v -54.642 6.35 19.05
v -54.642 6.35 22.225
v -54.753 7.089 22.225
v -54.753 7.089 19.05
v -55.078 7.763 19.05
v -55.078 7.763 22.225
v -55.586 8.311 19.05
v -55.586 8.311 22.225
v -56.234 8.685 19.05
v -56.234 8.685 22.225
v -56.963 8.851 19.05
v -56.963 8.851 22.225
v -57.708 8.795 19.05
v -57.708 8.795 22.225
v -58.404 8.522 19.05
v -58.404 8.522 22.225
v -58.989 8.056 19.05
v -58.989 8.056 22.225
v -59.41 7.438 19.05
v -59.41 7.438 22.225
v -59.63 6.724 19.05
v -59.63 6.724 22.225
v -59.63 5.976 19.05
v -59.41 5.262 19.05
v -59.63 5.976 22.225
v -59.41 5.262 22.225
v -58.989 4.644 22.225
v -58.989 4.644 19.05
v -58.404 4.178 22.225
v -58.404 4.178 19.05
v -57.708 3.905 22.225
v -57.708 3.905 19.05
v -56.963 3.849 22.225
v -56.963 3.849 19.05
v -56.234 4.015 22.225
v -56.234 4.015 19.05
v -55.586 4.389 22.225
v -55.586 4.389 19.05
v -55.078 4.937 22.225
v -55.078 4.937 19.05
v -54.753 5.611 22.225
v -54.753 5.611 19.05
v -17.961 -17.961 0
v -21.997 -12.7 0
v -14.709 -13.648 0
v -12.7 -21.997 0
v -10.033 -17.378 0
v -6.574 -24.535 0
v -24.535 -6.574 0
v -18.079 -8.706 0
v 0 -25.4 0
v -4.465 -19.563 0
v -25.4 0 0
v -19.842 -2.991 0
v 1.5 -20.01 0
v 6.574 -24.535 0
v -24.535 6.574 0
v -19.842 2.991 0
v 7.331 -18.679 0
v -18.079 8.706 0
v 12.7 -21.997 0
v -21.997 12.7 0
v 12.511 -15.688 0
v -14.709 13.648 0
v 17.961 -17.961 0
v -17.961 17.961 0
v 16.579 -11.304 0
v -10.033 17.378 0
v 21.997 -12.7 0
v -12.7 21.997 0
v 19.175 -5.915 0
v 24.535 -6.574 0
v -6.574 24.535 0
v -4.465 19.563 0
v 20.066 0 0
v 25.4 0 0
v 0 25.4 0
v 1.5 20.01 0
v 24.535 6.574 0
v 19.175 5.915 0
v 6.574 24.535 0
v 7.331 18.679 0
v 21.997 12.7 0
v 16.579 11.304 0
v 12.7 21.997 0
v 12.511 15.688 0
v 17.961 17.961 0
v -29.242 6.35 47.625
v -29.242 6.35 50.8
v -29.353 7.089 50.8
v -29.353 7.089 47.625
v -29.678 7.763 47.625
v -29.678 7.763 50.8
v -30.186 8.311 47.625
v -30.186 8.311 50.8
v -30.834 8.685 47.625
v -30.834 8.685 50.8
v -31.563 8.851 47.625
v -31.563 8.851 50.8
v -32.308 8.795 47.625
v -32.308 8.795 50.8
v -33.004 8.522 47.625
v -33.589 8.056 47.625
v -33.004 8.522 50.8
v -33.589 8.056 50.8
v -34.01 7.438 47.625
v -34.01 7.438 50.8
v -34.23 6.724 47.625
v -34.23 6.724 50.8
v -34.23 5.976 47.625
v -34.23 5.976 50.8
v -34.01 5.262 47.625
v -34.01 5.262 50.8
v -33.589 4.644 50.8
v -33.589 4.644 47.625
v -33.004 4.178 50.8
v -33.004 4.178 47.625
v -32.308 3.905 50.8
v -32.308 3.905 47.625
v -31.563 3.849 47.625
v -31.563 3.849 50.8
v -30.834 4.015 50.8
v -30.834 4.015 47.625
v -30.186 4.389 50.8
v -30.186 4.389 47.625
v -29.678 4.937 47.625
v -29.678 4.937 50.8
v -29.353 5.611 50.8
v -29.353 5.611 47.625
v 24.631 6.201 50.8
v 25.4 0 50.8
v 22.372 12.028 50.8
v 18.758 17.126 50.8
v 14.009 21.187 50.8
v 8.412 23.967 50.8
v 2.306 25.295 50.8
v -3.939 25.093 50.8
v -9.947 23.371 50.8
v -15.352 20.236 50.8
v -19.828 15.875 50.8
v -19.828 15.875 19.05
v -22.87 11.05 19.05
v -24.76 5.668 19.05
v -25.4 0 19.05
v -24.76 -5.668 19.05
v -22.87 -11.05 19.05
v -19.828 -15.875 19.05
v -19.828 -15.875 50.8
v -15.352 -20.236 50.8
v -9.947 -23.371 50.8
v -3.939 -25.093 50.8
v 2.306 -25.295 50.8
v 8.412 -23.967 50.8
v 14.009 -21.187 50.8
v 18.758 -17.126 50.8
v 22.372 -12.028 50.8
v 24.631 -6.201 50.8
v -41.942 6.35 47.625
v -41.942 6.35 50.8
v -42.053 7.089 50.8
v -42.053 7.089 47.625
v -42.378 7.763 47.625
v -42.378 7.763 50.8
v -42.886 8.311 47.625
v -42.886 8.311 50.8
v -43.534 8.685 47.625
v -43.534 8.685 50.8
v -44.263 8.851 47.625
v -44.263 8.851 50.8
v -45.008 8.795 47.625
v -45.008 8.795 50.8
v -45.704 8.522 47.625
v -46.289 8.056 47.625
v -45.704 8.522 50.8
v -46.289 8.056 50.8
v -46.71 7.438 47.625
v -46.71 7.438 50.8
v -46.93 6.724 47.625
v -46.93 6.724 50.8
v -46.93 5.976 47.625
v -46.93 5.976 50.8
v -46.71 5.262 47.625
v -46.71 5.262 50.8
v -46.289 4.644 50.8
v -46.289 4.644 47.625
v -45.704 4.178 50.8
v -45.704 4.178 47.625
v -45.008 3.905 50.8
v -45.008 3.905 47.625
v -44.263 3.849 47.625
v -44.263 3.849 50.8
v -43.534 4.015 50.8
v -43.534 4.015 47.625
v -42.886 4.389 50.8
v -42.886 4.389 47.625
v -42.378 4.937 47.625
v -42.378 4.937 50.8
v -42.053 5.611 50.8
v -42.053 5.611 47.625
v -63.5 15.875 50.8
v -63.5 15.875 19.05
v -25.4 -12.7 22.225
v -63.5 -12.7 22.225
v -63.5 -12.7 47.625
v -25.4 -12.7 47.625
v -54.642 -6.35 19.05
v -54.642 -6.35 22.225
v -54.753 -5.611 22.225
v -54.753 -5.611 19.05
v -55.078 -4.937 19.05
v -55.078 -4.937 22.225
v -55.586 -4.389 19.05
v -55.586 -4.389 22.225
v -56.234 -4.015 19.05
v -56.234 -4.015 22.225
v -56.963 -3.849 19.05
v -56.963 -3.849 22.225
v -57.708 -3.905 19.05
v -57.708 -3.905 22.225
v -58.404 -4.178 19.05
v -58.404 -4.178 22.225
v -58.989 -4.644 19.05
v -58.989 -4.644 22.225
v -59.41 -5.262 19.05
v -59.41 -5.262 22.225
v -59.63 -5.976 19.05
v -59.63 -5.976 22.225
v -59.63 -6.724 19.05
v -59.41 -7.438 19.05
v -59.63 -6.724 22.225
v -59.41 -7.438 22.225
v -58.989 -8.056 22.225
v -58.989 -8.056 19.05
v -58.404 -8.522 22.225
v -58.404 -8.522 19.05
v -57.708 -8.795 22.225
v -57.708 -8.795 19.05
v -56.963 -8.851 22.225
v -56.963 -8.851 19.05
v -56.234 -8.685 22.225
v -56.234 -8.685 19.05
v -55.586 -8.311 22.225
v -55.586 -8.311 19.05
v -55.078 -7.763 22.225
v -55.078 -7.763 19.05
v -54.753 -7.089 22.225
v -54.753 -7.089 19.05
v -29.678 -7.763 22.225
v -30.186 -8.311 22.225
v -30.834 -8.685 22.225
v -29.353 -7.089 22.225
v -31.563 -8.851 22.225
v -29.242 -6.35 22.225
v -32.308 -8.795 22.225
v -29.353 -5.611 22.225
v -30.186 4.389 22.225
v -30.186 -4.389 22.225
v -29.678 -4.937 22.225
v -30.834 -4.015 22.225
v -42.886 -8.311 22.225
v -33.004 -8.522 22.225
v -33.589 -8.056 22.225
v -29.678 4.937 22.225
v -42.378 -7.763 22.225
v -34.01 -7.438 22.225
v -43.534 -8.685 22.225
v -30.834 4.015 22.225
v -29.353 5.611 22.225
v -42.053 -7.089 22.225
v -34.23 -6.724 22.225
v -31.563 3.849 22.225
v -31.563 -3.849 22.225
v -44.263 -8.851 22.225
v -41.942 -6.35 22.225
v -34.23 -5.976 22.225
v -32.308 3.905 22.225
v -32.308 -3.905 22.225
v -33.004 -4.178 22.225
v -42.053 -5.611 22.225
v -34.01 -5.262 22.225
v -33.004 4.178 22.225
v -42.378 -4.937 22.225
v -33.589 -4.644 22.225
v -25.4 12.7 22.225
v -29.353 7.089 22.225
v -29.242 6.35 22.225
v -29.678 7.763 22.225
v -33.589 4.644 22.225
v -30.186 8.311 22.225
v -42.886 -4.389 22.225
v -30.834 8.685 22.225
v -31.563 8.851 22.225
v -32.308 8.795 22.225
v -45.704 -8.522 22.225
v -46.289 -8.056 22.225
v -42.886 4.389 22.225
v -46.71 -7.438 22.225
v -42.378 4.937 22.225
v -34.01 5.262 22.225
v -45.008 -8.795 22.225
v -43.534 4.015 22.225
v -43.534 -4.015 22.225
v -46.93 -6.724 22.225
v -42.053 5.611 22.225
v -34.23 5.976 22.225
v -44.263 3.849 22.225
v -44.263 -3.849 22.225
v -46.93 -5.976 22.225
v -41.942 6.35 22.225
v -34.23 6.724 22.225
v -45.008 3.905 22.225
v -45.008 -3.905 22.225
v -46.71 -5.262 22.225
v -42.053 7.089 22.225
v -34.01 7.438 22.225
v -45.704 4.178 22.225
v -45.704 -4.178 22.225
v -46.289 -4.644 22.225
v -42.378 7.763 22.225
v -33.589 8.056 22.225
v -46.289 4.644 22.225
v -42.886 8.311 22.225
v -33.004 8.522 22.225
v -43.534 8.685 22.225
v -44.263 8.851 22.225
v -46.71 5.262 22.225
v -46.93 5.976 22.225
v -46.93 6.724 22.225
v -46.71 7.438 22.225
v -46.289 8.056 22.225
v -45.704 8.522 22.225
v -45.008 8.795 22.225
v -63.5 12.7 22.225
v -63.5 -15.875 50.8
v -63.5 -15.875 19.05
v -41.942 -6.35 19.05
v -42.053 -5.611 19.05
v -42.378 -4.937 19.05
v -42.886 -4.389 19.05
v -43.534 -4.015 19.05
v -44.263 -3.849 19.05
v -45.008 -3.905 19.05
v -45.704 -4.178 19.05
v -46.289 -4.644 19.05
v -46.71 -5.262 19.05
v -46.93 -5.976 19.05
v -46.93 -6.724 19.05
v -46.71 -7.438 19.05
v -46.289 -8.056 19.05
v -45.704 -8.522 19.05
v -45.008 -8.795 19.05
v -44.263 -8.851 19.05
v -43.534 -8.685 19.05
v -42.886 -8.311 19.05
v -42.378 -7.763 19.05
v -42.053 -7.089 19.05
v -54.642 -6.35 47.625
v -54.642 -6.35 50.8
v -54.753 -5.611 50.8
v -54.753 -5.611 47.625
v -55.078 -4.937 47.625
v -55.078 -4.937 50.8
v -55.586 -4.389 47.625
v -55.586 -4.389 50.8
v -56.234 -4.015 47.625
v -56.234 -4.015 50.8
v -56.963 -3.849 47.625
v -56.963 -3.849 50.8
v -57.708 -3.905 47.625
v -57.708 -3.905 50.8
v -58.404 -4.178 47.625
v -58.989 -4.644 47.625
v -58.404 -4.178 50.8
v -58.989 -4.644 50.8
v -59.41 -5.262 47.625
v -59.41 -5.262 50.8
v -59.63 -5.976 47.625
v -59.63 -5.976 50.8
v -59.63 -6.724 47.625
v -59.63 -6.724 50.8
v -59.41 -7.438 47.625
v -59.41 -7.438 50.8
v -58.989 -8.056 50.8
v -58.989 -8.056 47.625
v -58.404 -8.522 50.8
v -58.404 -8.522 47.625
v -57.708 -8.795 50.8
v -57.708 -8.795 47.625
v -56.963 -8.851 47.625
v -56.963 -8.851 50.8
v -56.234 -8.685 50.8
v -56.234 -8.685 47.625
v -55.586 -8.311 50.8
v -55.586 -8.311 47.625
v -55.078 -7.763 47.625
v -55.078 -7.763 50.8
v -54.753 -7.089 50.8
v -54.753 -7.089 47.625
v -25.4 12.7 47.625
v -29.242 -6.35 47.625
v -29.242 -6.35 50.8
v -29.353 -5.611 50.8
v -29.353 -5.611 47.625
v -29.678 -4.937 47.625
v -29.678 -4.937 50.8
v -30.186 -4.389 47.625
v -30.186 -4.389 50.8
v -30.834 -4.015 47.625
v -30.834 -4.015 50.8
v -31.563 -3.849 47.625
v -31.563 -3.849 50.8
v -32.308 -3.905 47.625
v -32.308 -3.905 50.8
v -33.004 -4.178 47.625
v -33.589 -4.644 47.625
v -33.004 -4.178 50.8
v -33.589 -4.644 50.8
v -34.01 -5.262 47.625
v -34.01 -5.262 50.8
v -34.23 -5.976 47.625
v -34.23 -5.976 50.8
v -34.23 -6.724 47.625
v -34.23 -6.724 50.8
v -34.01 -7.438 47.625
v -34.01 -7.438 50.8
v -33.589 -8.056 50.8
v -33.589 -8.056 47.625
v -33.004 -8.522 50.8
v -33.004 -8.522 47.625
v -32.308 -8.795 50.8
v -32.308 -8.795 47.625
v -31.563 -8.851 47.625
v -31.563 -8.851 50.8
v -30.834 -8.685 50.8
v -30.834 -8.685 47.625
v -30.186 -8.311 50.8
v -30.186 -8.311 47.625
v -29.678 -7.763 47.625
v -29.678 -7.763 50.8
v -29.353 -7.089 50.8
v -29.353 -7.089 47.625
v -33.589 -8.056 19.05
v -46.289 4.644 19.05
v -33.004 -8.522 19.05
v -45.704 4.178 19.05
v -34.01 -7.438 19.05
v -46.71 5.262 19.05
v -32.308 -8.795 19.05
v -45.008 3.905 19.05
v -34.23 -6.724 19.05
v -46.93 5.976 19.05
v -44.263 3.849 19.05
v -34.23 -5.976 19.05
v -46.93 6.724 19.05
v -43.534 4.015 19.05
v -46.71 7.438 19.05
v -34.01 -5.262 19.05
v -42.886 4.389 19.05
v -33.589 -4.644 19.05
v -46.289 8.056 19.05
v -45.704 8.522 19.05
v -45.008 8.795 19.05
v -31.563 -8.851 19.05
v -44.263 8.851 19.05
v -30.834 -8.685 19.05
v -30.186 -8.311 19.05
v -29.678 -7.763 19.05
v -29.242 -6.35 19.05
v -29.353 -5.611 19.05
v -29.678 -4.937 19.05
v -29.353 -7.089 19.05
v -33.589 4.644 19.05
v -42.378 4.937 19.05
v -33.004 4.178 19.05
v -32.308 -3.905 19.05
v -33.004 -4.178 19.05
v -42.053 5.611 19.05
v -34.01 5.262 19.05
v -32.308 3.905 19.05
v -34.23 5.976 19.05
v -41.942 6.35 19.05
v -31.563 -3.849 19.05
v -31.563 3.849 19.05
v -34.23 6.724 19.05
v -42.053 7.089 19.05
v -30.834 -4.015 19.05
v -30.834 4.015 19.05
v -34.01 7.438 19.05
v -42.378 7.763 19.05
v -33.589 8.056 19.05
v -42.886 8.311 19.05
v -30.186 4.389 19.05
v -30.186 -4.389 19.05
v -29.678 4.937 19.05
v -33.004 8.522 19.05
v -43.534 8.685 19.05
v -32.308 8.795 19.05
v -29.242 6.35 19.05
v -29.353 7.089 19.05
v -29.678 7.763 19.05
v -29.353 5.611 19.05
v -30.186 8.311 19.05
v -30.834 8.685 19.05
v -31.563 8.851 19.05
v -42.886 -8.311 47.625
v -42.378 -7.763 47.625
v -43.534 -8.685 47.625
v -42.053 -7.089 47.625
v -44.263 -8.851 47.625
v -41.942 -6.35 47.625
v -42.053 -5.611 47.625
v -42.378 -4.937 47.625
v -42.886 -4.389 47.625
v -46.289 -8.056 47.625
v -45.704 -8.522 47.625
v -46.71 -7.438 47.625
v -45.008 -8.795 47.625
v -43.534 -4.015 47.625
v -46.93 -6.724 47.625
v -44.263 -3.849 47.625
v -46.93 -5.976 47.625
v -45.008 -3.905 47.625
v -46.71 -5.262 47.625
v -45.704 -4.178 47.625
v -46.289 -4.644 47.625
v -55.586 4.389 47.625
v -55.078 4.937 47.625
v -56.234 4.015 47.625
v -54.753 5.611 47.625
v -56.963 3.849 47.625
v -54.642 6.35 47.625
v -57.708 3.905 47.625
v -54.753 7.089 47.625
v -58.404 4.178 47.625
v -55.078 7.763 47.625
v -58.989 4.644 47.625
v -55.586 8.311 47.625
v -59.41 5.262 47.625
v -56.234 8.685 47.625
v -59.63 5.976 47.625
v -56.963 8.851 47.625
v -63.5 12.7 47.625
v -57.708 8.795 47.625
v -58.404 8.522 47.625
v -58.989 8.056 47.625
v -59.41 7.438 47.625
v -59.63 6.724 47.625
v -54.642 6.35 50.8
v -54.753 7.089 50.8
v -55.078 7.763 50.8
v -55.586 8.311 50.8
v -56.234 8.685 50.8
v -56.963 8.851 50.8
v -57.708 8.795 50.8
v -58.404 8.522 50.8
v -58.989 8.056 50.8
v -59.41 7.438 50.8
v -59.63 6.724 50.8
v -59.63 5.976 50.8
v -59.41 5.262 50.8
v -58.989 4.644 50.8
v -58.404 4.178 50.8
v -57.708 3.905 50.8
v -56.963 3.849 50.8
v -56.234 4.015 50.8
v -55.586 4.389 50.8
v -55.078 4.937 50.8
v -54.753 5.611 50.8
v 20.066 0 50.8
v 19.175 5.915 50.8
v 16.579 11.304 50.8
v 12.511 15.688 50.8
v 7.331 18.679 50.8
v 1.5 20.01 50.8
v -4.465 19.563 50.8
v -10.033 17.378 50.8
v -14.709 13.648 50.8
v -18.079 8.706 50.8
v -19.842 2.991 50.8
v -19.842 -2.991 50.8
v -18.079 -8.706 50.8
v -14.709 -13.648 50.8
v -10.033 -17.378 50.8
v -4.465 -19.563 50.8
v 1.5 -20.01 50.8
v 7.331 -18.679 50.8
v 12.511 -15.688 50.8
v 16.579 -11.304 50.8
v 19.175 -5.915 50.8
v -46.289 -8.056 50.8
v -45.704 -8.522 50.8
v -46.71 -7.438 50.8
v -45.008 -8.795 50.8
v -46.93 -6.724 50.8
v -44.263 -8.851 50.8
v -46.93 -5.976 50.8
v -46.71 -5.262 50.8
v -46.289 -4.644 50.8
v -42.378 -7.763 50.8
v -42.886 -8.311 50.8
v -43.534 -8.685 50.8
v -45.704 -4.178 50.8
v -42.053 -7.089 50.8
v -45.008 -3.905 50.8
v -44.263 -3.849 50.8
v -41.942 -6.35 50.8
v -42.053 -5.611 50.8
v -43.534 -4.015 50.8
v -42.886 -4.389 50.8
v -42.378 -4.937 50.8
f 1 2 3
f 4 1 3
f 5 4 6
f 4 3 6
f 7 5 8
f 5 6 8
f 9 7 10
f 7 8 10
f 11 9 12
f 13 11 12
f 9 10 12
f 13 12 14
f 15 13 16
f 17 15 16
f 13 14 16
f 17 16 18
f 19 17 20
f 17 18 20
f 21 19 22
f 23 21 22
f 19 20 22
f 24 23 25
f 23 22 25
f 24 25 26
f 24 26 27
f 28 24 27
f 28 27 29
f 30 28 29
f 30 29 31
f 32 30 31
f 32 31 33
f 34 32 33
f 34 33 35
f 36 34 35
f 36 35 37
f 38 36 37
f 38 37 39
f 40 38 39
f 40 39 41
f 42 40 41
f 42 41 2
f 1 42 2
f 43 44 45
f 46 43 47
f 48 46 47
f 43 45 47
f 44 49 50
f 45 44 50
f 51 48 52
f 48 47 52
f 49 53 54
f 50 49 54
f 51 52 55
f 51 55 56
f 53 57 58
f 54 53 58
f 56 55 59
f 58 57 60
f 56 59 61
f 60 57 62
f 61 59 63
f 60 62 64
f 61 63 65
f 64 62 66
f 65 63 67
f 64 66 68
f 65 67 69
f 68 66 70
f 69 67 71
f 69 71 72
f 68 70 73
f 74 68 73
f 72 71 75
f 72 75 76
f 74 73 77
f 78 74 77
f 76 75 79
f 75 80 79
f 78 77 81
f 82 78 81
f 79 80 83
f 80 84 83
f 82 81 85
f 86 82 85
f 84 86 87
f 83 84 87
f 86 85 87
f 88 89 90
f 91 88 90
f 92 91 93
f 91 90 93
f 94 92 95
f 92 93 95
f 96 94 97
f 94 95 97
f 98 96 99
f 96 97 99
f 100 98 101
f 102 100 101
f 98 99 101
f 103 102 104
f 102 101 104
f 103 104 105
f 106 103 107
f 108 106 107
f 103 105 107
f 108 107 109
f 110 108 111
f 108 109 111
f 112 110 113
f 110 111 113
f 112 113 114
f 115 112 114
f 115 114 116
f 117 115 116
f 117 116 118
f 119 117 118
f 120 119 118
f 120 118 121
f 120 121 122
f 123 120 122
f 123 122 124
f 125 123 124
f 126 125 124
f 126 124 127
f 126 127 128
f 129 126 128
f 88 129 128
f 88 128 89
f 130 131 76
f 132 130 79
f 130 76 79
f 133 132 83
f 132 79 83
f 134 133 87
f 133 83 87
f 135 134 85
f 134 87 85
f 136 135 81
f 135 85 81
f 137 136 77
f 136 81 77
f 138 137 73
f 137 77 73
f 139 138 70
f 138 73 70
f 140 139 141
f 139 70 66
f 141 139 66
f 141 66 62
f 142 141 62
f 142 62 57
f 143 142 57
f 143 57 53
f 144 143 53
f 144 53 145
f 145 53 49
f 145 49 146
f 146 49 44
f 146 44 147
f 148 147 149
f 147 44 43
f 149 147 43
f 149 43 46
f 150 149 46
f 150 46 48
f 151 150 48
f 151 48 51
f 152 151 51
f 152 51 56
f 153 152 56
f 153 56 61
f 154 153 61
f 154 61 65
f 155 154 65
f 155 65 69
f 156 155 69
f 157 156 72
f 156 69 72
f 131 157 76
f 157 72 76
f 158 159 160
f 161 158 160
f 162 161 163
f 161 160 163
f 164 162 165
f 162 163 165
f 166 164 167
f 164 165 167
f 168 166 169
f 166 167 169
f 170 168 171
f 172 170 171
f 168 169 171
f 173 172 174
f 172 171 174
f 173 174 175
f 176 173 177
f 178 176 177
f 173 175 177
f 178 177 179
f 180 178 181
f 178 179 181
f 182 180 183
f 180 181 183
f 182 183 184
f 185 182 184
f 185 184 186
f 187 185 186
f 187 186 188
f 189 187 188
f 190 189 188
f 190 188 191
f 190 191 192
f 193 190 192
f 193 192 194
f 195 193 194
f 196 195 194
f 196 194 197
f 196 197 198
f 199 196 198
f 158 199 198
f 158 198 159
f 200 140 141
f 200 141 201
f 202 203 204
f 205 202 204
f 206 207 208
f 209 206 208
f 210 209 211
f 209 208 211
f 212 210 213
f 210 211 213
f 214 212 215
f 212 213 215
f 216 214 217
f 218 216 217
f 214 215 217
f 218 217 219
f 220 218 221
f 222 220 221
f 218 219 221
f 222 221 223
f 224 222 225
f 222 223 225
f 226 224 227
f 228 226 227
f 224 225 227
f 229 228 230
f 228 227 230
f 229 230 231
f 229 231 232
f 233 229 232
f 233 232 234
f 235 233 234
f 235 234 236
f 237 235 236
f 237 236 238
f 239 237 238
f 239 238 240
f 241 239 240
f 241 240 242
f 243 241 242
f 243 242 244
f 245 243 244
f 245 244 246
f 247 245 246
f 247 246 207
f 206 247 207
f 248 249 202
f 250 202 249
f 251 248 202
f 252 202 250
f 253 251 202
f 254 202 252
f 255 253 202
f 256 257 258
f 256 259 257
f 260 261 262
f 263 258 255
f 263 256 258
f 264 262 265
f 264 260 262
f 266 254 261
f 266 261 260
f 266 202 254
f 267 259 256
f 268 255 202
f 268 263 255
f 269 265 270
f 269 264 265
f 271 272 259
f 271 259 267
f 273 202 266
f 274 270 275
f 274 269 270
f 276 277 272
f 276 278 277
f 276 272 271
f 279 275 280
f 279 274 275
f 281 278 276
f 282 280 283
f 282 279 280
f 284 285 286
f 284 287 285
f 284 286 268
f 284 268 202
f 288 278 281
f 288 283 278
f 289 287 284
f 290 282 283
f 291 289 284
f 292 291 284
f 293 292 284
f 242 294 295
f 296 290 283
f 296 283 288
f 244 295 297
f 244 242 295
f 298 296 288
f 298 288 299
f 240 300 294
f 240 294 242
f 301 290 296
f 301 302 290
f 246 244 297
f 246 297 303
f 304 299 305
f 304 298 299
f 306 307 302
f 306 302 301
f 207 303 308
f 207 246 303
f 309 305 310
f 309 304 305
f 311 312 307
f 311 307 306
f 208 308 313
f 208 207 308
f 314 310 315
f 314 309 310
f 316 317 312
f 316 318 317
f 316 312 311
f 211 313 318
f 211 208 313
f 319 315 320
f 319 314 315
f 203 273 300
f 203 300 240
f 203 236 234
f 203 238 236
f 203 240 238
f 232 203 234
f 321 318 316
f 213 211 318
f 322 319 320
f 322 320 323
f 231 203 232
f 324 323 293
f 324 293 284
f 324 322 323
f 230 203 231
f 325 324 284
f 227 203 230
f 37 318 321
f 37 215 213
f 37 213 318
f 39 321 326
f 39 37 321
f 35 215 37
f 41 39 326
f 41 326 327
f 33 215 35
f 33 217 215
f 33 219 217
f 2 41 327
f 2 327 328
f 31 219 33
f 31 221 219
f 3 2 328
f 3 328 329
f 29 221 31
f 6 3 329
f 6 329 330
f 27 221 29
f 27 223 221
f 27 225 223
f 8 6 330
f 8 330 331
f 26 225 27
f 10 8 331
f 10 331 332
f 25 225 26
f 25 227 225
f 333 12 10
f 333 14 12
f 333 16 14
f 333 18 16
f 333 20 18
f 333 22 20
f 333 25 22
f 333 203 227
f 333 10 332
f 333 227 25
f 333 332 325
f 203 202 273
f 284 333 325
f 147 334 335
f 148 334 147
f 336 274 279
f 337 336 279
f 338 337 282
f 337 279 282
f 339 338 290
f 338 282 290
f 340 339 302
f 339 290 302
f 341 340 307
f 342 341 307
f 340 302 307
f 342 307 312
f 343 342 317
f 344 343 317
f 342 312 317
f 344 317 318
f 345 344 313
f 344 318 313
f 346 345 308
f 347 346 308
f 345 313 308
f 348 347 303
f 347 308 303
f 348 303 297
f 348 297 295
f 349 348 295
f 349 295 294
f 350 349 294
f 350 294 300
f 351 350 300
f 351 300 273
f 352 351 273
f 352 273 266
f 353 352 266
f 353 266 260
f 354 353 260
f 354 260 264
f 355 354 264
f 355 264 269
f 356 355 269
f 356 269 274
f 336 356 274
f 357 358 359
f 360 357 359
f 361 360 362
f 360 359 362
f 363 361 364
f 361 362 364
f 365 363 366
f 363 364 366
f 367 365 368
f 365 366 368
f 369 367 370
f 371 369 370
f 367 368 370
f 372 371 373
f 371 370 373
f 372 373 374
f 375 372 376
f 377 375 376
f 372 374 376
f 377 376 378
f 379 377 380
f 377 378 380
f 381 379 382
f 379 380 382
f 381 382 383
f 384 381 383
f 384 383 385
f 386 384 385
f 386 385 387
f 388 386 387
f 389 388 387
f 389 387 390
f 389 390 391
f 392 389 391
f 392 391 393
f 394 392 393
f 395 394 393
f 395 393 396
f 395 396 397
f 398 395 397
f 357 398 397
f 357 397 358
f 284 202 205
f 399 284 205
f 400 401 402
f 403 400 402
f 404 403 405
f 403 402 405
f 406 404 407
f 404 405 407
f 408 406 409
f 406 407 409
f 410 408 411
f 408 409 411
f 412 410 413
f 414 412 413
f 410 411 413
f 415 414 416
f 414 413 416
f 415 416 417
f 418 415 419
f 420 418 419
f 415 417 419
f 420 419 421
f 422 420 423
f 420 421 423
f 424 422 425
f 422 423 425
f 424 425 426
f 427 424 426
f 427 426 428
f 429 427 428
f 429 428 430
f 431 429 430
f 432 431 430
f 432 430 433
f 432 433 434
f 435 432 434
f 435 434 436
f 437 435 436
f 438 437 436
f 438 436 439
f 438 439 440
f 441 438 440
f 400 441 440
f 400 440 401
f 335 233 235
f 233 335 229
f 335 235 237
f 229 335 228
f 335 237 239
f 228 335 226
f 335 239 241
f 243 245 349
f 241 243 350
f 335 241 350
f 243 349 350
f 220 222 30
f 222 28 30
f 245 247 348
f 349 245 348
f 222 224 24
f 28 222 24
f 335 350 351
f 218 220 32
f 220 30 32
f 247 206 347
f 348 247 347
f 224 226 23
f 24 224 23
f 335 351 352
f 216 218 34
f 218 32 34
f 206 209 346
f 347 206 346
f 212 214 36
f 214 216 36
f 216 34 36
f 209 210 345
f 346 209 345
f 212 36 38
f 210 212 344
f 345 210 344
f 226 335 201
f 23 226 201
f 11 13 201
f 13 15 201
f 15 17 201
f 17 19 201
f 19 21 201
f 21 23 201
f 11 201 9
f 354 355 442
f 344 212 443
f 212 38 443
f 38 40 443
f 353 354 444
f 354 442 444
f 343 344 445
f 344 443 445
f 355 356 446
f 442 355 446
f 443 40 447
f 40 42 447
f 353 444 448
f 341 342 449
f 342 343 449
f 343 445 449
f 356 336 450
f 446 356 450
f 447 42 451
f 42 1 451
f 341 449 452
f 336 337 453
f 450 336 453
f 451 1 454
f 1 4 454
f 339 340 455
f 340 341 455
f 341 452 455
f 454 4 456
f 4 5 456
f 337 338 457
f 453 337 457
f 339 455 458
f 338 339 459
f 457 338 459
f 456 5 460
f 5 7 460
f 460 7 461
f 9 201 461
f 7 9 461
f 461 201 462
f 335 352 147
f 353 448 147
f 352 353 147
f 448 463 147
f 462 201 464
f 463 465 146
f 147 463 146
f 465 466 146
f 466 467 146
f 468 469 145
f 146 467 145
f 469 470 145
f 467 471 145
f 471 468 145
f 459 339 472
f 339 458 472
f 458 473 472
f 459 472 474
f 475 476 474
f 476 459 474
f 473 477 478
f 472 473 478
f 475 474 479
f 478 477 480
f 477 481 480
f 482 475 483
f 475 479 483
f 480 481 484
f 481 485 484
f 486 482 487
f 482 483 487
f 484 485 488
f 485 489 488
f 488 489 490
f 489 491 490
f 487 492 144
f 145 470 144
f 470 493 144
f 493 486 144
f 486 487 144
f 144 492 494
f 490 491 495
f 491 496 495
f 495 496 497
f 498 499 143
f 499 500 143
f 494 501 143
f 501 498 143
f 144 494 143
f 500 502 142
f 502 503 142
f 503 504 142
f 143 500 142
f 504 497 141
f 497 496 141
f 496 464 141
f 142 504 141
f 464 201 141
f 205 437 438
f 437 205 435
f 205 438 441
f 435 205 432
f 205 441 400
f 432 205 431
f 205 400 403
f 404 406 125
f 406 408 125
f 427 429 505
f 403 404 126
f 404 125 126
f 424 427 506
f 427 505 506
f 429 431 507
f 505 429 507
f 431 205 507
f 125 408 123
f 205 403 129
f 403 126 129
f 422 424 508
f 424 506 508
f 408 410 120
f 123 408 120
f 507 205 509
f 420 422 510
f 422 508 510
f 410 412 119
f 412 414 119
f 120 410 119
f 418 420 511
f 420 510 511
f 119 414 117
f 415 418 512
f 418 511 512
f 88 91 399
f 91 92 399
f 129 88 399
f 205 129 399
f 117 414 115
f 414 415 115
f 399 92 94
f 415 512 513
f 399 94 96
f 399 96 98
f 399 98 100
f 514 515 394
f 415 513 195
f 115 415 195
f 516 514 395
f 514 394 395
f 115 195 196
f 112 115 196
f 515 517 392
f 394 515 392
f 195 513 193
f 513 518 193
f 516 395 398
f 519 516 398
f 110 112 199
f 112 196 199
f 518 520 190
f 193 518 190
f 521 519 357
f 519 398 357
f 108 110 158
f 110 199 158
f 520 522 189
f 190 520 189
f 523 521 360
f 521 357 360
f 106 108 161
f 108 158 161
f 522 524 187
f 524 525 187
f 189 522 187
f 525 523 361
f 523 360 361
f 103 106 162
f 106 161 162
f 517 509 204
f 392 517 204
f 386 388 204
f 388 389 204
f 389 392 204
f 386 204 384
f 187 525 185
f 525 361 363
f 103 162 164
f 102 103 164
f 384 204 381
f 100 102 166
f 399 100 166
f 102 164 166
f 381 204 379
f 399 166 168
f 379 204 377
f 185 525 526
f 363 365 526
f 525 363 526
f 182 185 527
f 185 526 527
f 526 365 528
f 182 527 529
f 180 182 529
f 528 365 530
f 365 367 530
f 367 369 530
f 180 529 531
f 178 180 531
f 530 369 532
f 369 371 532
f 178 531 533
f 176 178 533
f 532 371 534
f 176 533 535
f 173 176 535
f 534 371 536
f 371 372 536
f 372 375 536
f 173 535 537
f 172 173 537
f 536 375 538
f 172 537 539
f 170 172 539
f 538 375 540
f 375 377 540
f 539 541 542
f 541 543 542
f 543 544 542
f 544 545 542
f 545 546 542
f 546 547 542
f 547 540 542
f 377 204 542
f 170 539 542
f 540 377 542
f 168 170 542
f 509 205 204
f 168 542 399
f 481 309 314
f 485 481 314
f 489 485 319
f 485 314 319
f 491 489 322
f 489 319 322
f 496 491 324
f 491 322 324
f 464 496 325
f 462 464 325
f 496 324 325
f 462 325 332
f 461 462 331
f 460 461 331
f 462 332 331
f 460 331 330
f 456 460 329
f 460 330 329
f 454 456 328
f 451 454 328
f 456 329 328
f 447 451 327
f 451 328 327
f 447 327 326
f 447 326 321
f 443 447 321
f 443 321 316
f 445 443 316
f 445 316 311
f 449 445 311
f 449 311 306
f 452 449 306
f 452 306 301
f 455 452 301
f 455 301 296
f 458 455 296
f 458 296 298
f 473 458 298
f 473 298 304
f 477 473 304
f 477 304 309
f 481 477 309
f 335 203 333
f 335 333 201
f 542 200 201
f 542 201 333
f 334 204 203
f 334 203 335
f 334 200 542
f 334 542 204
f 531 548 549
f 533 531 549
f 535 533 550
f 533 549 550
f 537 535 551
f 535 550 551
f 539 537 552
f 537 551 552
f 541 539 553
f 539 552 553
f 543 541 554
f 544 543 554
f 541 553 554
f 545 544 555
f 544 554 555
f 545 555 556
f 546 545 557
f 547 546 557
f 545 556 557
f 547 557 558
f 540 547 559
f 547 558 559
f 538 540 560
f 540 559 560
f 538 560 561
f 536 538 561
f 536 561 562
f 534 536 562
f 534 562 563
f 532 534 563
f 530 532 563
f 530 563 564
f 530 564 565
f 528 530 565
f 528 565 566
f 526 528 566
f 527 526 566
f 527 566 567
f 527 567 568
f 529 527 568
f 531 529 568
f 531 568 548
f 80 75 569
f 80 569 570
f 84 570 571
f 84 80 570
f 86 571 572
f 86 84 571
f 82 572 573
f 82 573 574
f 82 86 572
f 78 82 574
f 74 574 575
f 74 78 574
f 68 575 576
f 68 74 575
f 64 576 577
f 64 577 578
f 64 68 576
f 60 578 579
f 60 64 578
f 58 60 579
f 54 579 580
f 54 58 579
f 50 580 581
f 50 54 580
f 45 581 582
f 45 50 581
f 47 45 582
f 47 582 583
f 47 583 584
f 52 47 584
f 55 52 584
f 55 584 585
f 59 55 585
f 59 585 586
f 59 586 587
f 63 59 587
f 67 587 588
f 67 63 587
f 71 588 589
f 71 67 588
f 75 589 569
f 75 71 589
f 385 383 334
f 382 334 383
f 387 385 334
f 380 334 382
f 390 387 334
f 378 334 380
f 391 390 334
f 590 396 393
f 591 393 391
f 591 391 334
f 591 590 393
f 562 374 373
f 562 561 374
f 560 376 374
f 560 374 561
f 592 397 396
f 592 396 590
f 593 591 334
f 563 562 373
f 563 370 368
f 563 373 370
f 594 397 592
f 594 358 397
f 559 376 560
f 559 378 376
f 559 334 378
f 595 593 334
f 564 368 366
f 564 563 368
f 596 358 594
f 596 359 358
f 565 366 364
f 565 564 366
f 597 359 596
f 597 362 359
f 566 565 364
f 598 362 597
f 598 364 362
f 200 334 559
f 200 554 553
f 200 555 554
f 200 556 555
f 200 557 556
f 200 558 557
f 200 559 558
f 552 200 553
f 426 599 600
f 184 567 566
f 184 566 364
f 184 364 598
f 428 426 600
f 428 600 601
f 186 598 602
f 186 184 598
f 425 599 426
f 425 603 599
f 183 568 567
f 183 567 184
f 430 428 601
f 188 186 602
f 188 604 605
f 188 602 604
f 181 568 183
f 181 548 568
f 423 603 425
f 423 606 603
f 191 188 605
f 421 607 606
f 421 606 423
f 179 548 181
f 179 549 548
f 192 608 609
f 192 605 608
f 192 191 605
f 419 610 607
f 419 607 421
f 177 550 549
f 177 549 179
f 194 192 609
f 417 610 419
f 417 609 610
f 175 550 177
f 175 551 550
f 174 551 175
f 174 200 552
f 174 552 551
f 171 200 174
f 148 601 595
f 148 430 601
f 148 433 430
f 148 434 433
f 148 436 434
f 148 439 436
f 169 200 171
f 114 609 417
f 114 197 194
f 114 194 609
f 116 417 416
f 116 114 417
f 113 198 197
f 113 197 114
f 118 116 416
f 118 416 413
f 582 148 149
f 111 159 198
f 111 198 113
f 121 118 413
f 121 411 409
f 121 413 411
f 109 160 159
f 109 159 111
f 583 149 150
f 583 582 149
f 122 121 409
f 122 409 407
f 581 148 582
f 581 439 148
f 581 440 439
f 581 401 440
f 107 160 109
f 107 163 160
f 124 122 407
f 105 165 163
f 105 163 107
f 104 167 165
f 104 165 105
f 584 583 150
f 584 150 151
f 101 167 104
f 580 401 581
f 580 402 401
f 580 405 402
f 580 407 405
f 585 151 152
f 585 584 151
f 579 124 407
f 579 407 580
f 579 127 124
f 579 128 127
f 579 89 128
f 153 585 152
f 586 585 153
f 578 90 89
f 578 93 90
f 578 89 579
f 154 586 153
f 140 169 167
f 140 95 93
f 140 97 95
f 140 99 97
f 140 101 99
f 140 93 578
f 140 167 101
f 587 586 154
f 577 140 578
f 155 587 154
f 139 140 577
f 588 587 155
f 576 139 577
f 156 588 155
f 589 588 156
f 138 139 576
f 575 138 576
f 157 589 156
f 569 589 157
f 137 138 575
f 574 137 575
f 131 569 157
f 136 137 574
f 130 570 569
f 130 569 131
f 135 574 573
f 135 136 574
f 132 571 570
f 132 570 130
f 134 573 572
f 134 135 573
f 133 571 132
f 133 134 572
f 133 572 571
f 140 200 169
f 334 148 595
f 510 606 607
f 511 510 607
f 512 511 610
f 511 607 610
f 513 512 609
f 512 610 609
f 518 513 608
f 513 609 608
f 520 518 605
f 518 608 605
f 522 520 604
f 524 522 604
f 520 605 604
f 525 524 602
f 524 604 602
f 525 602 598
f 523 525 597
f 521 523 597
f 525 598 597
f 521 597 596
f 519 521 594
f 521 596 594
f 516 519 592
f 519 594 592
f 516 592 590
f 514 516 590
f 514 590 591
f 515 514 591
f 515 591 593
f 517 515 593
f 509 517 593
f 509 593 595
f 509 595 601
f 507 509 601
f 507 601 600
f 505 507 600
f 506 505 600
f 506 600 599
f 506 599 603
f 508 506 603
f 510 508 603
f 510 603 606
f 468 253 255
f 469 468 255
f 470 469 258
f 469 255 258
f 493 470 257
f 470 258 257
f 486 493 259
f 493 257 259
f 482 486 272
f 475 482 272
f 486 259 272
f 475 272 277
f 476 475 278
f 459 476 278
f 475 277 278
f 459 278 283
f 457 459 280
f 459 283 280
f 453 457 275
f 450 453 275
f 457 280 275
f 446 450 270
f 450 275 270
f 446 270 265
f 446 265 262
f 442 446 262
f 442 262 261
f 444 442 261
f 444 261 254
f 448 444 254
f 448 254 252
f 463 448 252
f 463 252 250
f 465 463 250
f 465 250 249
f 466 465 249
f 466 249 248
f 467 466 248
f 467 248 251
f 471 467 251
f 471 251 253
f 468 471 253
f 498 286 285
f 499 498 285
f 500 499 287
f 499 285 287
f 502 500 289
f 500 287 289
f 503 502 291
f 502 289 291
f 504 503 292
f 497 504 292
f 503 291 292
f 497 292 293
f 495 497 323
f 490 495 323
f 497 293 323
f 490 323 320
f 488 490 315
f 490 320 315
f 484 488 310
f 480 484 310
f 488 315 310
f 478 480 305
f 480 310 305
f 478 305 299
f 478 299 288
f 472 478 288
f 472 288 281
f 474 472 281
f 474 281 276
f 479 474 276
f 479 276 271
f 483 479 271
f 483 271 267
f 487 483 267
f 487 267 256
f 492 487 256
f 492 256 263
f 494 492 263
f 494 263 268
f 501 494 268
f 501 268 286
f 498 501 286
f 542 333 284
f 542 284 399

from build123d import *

# Parameters (mm, degrees)
SKETCH1_R           = 25.4
SKETCH1_R_2         = 20.066
BOSS_EXTRUDE1_DEPTH = 50.8
BOSS_EXTRUDE2_DEPTH = 31.75
SKETCH3_W           = 25.4
SKETCH3_H           = 25.4
CUT_EXTRUDE1_DEPTH  = 38.1
SKETCH4_R           = 2.50825
CUT_EXTRUDE2_DEPTH  = 31.75
LPATTERN1_COUNT     = 3
LPATTERN1_PITCH     = 12.7


with BuildPart() as part:
    # Sketch1 → Boss-Extrude1 (new body)
    with BuildSketch(Plane.XY):
        Circle(SKETCH1_R)
        Circle(SKETCH1_R_2, mode=Mode.SUBTRACT)
    extrude(amount=BOSS_EXTRUDE1_DEPTH)

    # Sketch2 → Boss-Extrude2 (add)
    with BuildSketch(Plane.XY.offset(50.8)):
        with BuildLine():
            Line((-19.827868645, 15.875), (-63.5, 15.875))
            Line((-63.5, 15.875), (-63.5, -15.875))
            Line((-63.5, -15.875), (-19.827868645, -15.875))
            ThreePointArc((-19.827868645, -15.875), (-25.4, 0), (-19.827868645, 15.875))
        make_face()
    extrude(amount=-BOSS_EXTRUDE2_DEPTH)

    # Sketch3 → Cut-Extrude1 (cut)
    with BuildSketch(Plane.ZY.offset(63.5)):
        with Locations((34.925, 0)):
            Rectangle(SKETCH3_W, SKETCH3_H)
    extrude(amount=-CUT_EXTRUDE1_DEPTH, mode=Mode.SUBTRACT)

    # Sketch4 → Cut-Extrude2 (cut)
    with BuildSketch(Plane.XY.offset(50.8)):
        with Locations((-57.15, 6.35)):
            Circle(SKETCH4_R)
        with Locations((-57.15, -6.35)):
            Circle(SKETCH4_R)
    cut_extrude2 = extrude(amount=-CUT_EXTRUDE2_DEPTH, mode=Mode.SUBTRACT)

    # LPattern1: Cut-Extrude2 ×3
    with Locations(*[(i * LPATTERN1_PITCH, 0, 0) for i in range(1, LPATTERN1_COUNT)]):
        add(cut_extrude2, mode=Mode.SUBTRACT)


solid = part.part
